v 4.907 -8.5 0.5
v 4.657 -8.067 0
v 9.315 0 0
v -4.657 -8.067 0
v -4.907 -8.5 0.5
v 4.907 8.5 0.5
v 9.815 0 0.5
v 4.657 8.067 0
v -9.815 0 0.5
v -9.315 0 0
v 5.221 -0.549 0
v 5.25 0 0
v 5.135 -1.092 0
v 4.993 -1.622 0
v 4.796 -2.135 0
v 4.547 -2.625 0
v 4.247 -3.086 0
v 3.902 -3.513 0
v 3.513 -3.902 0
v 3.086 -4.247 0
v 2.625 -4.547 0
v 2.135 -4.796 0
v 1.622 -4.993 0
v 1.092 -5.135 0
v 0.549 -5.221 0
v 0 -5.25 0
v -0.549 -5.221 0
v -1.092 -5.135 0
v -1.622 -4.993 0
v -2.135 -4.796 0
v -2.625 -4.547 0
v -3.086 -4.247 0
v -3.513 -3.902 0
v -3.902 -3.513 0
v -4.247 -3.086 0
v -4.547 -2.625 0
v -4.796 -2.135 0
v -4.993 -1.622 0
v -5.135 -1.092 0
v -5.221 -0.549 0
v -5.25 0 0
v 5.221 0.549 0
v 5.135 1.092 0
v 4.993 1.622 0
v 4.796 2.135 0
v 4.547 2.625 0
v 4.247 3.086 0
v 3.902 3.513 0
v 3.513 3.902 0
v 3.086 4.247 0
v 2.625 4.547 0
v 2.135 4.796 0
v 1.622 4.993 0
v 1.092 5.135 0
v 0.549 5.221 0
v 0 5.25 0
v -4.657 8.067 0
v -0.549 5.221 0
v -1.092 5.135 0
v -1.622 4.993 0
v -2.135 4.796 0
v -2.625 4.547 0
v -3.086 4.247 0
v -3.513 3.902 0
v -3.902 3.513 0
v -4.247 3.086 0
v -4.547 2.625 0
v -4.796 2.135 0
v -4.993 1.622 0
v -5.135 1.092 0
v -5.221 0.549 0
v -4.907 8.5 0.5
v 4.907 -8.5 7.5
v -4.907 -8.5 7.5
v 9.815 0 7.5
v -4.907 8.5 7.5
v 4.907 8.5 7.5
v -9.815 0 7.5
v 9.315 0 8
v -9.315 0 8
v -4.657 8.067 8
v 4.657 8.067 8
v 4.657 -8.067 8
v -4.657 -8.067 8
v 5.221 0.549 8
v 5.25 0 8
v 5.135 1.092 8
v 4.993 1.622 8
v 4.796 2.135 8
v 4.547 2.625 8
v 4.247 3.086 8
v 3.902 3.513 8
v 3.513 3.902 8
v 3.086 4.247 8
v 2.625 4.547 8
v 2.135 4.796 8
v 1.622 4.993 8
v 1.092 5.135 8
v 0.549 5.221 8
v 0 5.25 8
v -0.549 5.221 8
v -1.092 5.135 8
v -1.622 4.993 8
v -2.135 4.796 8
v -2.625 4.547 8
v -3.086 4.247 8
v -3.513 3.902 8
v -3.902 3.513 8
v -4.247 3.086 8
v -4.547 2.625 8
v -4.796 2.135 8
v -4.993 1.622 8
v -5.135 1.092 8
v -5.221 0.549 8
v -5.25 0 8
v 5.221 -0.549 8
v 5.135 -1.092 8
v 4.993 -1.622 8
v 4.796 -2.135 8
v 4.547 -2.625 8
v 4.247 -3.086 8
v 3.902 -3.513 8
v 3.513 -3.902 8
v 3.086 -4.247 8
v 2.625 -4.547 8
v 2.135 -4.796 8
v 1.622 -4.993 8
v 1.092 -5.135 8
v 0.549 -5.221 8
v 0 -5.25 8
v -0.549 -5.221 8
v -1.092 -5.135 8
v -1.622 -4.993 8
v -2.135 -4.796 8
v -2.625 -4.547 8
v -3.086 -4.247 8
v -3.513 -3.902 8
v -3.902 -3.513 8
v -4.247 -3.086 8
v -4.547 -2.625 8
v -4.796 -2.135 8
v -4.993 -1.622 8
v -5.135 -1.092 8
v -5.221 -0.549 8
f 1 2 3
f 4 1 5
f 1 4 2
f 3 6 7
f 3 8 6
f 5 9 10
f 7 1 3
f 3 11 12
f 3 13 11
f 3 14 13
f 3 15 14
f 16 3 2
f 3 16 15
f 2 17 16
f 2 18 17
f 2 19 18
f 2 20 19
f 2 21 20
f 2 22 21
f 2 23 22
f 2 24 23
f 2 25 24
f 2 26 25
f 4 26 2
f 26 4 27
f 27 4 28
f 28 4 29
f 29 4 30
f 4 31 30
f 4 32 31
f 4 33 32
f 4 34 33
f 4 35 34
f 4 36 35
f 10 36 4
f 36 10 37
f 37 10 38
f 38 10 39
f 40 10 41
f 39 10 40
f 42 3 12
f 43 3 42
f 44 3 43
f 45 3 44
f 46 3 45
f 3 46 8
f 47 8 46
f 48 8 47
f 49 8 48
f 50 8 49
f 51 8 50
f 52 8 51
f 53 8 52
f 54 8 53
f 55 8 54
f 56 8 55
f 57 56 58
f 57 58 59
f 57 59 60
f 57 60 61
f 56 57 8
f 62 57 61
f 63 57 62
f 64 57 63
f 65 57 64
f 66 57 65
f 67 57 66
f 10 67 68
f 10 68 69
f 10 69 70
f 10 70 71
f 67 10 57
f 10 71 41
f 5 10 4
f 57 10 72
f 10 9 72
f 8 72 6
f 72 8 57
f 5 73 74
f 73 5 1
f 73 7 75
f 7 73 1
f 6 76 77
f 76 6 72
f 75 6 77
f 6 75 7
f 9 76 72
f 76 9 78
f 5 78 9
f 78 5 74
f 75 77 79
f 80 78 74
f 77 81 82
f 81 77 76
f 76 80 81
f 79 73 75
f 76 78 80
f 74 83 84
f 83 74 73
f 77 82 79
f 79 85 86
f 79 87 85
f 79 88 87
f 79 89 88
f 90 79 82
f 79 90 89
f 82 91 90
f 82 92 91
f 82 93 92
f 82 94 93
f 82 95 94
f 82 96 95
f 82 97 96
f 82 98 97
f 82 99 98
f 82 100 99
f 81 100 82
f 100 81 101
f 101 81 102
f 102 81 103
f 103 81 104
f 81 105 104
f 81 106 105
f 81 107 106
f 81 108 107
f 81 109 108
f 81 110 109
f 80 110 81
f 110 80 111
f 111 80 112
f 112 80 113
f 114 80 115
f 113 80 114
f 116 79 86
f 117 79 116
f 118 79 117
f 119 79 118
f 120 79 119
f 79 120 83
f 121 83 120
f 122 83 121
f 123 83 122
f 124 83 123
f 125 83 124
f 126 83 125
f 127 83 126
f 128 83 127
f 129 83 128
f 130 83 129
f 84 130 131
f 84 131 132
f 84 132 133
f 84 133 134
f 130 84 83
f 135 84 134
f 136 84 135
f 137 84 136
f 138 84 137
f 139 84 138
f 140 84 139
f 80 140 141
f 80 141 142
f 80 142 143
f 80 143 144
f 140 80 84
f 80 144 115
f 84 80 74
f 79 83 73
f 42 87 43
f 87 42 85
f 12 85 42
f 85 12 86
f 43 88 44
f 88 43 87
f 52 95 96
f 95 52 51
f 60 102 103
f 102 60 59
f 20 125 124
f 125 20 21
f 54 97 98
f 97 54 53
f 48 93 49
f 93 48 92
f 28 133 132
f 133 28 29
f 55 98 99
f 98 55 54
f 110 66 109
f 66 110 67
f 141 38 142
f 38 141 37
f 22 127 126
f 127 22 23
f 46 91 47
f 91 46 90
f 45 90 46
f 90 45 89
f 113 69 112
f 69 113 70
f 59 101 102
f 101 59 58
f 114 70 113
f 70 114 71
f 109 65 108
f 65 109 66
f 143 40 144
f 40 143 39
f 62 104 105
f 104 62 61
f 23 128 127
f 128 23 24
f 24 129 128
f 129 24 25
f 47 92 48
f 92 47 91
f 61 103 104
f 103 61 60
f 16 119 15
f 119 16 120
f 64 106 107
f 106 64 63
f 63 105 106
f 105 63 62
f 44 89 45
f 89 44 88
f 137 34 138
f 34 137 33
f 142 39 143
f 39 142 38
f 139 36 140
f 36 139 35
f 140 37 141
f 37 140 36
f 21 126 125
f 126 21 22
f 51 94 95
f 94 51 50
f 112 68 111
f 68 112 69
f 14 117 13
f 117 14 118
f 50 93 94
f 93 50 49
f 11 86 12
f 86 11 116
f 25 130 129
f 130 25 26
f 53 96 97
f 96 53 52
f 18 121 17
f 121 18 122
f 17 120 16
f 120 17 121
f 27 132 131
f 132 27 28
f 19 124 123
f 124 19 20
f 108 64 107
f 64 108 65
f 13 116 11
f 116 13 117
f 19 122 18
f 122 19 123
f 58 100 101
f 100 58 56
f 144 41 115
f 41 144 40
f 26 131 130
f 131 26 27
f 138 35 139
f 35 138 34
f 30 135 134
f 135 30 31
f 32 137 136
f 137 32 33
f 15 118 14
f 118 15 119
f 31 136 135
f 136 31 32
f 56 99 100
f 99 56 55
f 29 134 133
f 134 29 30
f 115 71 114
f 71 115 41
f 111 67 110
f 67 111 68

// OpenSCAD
// Through hex nut.
$fn = 60;
eps = 0.02;
thread_clearance_d = 10.5;
flat = 17;
thickness = 8;
chamfer = 0.5;
difference() {
    union() {
        cylinder(d1 = flat / cos(30) - 2 * chamfer, d2 = flat / cos(30), h = chamfer, $fn = 6);
        translate([0, 0, chamfer]) cylinder(d = flat / cos(30), h = thickness - 2 * chamfer, $fn = 6);
        translate([0, 0, thickness - chamfer]) cylinder(d1 = flat / cos(30), d2 = flat / cos(30) - 2 * chamfer, h = chamfer, $fn = 6);
    }
    translate([0, 0, -eps]) cylinder(d = thread_clearance_d, h = thickness + 2 * eps);
}
